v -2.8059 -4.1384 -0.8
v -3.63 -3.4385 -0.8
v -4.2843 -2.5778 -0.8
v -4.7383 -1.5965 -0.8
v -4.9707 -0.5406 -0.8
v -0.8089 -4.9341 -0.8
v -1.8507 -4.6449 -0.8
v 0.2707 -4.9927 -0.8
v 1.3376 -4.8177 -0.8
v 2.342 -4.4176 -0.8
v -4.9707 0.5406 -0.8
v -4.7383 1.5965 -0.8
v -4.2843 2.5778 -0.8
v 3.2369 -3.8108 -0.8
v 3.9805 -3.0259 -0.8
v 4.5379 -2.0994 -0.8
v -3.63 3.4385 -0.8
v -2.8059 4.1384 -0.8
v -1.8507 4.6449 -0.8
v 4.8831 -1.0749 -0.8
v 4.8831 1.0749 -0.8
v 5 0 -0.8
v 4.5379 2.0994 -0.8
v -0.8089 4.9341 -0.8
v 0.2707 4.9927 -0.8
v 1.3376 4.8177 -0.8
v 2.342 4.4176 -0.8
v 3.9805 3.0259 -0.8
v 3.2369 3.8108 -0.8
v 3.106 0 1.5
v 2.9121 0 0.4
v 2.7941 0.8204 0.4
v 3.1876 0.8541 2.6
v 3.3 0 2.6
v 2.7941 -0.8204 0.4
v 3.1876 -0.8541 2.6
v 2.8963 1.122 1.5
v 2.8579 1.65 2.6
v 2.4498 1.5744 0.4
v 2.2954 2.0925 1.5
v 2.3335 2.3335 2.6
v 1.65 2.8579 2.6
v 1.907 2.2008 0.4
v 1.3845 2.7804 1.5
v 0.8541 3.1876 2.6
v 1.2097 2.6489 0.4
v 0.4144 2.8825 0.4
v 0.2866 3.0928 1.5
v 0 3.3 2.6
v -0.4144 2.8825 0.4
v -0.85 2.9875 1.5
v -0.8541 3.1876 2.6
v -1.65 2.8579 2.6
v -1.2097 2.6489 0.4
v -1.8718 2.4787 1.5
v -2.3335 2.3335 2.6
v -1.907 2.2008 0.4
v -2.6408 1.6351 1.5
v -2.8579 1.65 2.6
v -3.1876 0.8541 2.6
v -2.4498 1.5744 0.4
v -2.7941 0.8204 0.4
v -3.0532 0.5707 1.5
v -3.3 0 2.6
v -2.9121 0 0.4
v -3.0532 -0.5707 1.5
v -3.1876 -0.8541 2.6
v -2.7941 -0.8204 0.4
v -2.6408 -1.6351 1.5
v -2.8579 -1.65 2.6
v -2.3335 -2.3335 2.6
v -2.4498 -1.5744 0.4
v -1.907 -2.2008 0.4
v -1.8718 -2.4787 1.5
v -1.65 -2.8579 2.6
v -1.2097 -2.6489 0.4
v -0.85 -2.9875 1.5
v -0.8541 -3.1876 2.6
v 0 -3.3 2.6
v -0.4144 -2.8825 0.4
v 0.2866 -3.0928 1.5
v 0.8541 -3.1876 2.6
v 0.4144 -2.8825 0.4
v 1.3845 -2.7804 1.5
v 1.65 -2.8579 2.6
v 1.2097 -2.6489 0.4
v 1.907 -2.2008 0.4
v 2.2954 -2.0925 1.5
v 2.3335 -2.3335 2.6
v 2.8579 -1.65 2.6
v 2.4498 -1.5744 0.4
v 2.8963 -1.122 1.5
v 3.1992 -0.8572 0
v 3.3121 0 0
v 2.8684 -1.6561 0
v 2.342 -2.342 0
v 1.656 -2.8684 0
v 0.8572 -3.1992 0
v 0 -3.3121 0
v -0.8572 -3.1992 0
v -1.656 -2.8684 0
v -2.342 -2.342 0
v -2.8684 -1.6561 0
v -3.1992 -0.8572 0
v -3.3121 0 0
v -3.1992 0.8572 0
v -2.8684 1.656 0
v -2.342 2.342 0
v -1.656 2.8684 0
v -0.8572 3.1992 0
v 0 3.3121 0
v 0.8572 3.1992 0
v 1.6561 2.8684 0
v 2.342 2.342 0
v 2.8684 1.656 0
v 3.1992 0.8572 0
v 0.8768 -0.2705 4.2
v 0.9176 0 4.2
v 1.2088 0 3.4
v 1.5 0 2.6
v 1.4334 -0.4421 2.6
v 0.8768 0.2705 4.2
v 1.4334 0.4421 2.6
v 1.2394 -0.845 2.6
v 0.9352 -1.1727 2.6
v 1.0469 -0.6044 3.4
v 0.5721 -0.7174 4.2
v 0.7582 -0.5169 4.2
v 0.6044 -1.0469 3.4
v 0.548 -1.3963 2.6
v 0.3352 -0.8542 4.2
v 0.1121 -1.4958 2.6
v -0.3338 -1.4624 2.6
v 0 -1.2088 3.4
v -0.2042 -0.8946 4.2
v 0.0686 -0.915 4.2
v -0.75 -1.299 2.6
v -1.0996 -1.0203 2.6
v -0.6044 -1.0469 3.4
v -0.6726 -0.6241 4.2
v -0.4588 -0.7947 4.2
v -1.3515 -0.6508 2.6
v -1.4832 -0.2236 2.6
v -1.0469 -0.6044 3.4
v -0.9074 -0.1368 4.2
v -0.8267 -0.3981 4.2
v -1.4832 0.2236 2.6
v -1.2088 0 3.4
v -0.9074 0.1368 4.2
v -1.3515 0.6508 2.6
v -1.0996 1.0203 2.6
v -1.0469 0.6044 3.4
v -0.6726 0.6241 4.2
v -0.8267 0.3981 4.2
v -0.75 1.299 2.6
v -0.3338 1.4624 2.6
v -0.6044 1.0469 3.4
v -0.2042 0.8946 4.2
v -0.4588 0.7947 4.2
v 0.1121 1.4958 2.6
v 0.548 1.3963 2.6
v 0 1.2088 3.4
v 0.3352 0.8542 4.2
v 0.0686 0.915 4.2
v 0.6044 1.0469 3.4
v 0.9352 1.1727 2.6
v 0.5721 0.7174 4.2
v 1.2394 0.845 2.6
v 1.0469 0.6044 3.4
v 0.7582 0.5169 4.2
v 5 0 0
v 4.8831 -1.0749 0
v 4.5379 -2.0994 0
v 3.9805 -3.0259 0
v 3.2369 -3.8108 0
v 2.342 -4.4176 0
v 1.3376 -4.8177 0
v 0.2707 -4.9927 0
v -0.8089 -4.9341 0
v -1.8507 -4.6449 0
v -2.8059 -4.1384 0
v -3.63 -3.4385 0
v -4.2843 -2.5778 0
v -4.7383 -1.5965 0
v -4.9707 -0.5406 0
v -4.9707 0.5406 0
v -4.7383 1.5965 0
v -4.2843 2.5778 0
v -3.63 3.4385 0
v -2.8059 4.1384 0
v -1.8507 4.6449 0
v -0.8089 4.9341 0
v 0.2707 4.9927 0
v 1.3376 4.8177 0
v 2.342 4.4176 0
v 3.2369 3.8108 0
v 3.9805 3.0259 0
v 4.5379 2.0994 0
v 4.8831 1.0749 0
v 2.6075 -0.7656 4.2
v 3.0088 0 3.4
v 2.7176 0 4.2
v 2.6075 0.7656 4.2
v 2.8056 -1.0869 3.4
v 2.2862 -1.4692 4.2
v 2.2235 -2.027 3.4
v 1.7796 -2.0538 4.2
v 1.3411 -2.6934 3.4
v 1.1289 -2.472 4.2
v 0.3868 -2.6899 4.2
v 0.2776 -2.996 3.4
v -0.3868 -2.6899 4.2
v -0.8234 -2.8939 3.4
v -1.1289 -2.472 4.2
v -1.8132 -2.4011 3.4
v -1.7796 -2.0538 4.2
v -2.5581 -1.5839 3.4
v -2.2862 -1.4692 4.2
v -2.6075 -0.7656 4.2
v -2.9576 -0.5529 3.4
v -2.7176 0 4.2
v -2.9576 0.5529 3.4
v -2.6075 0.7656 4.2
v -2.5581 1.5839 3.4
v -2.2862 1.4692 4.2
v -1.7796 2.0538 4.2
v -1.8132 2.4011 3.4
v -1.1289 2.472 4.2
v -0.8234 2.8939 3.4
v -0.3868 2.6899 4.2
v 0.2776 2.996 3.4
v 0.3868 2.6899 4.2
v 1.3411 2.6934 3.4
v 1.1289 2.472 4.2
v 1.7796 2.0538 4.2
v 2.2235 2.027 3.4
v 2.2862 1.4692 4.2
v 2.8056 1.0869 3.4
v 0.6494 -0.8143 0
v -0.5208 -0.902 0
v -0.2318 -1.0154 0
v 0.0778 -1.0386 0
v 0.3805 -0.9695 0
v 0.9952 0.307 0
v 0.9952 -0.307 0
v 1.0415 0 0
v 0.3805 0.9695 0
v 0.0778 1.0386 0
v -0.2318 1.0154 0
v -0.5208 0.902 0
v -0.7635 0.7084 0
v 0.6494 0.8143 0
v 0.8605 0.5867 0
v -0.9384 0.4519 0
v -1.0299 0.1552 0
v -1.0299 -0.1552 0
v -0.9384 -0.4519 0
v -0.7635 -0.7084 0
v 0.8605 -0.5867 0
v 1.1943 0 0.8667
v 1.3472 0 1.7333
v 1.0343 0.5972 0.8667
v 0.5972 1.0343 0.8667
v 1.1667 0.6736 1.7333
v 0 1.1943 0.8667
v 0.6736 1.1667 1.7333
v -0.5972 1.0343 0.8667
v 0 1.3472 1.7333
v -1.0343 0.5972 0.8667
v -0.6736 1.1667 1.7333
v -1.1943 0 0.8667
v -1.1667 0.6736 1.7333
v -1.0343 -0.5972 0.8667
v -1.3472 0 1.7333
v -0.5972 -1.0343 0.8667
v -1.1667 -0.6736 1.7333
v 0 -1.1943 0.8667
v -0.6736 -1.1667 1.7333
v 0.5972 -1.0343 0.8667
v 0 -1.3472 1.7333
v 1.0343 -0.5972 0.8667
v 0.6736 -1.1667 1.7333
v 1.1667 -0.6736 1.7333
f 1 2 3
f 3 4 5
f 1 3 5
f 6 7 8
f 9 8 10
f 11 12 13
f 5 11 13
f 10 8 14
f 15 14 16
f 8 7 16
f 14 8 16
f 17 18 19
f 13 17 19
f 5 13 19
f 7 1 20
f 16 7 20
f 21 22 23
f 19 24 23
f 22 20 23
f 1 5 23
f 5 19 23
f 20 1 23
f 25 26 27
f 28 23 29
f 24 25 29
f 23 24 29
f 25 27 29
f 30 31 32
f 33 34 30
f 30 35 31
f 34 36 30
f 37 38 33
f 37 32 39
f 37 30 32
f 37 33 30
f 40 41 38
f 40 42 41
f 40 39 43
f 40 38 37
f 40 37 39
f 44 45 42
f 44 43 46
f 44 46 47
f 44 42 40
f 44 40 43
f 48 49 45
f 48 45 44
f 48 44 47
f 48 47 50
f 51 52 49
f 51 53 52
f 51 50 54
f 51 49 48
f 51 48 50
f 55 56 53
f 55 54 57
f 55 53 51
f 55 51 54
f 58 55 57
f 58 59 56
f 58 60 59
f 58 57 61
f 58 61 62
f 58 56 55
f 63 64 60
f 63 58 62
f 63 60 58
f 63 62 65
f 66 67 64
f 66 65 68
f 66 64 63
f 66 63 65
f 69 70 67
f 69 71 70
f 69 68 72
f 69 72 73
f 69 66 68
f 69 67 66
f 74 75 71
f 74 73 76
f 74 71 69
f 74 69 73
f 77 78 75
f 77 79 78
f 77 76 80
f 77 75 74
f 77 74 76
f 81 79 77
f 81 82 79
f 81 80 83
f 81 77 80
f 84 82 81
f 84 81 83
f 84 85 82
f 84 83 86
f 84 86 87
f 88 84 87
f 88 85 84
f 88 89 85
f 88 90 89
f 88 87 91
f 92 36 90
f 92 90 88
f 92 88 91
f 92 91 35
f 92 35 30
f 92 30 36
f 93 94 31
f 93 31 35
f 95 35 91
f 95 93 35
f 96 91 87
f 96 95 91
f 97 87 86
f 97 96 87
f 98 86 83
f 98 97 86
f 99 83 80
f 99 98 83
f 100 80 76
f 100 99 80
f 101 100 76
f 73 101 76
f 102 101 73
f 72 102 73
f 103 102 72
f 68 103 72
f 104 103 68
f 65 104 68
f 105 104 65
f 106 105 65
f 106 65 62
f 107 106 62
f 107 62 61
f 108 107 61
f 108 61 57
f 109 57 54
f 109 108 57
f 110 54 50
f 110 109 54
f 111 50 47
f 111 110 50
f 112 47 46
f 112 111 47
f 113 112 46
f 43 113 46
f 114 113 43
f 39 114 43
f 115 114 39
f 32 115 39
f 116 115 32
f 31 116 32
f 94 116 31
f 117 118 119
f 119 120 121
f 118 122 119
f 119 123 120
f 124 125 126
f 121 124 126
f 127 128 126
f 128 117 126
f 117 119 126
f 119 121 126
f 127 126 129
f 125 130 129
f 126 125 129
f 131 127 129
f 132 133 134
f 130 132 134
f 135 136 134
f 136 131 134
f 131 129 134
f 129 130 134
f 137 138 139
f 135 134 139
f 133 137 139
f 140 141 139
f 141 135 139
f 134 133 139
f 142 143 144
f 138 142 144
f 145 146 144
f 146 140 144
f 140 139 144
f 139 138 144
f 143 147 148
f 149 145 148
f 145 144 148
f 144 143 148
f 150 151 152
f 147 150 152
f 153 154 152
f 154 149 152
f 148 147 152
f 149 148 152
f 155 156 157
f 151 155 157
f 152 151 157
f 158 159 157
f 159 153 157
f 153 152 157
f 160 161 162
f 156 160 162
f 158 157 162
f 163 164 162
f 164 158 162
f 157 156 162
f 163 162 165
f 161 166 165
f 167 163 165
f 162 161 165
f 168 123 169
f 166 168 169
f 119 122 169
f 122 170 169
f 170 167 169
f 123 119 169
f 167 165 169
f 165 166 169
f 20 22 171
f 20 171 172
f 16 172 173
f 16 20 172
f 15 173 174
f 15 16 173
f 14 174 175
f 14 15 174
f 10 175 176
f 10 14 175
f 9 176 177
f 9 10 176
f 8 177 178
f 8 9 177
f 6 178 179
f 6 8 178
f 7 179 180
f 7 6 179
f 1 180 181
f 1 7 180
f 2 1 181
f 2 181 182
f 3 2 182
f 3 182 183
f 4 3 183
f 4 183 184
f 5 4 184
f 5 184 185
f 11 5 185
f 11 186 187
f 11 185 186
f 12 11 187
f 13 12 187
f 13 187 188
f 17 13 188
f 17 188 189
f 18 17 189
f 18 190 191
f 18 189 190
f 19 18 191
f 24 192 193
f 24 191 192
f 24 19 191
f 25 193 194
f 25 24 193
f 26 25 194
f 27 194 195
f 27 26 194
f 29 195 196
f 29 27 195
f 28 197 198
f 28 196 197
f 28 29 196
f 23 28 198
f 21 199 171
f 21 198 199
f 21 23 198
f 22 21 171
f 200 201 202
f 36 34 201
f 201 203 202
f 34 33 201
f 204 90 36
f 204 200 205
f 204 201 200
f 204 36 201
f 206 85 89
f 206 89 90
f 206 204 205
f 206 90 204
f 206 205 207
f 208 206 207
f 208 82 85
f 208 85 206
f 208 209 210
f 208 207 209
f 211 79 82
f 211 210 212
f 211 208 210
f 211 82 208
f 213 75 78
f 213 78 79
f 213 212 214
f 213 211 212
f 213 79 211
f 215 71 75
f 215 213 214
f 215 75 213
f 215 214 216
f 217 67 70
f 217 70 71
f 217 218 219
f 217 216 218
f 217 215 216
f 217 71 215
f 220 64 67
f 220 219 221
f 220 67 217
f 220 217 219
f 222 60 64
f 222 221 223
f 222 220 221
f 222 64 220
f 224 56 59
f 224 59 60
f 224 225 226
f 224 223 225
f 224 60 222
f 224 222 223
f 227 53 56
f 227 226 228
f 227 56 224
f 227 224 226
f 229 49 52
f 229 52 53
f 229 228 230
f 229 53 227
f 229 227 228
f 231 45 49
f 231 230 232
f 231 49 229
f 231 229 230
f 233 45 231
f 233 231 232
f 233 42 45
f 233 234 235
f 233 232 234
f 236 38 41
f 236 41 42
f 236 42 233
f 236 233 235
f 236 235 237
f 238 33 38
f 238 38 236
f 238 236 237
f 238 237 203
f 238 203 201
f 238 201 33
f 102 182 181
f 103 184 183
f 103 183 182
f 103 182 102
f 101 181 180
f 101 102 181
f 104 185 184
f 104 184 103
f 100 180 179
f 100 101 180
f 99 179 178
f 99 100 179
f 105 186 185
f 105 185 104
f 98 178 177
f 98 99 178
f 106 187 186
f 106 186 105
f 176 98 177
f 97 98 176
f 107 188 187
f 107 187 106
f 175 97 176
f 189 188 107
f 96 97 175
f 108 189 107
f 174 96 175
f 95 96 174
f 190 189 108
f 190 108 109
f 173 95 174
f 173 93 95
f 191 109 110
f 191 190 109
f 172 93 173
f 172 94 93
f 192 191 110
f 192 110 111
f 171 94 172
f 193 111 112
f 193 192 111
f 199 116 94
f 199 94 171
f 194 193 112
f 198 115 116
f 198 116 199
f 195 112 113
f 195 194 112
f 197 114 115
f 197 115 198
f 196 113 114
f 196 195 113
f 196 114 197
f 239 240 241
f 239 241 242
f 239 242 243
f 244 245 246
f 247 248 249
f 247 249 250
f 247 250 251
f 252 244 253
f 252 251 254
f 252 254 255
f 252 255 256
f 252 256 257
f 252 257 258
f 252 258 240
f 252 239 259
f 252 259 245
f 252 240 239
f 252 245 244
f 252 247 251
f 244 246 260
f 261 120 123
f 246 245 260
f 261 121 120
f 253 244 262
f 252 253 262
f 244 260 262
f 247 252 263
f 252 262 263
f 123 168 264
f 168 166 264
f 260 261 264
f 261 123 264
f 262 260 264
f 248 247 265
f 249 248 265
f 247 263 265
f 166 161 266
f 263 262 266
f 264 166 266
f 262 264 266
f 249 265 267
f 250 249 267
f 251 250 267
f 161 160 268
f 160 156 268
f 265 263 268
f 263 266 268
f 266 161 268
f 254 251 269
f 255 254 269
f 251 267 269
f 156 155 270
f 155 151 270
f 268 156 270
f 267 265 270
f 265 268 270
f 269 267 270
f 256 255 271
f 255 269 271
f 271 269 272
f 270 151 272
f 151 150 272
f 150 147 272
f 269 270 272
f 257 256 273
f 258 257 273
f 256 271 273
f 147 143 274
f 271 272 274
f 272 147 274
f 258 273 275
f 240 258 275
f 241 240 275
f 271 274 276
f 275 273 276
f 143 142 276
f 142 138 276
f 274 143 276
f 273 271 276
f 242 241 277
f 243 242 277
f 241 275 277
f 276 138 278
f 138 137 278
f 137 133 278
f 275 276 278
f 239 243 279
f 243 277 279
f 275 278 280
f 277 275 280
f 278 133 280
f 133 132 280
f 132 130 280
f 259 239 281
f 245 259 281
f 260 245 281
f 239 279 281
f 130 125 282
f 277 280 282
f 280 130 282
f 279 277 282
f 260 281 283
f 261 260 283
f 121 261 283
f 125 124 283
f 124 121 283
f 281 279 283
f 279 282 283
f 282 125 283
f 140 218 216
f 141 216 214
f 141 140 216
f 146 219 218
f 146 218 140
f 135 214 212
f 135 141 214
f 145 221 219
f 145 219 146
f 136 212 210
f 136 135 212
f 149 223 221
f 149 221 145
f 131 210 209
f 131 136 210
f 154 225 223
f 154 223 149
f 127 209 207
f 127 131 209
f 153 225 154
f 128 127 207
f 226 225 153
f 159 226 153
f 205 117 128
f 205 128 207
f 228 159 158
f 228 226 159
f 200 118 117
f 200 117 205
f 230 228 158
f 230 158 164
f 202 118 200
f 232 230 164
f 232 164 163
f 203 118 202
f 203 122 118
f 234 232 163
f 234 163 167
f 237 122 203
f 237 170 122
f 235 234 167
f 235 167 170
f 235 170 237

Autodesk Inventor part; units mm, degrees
ref_plane "YZ Plane" through (0, 0, 0) normal (1, 0, 0) x (0, 1, 0)
ref_plane "XZ Plane" through (0, 0, 0) normal (0, 1, 0) x (-1, 0, 0)
ref_plane "XY Plane" through (0, 0, 0) normal (0, 0, 1) x (1, 0, 0)
sketch "Skizze1" plane through (0, 0, 0) normal (0, 1, 0) x (-1, 0, 0)
  line L0 (-6, 0) -> (1, 0) construction
  line L1 (-1.0415, 0) -> (-1.5, 2.6)
  line L2 (-1.5, 2.6) -> (-0.9176, 4.2)
  line L3 (-0.9176, 4.2) -> (-2.7176, 4.2)
  line L4 (-2.7176, 4.2) -> (-3.3, 2.6)
  line L5 (-3.3, 2.6) -> (-2.9121, 0.4)
  line L6 (-1.5, 2.6) -> (-3.3, 2.6) construction
  line L7 (-2.9121, 0.4) -> (-3.3121, 0)
  line L8 (-3.3121, 0) -> (-5, 0)
  line L9 (-5, 0) -> (-5, -0.8)
  line L10 (-5, -0.8) -> (0, -0.8)
  line L11 (0, -0.8) -> (0, 0)
  line L12 (-1.0415, 0) -> (0, 0)
  line L13 (0, -0.8) -> (0, 4.2)
  dimension "d0" = 80
  dimension "d1" = 70
  dimension "d2" = 1.8
  dimension "d3" = 2.6
  dimension "d4" = 1.6
  dimension "d21" = 45
  dimension "d22" = 0.4
  dimension "d23" = 0.8
  dimension "d24" = 10
  dimension "d26" = 6.6
revolve "Umdrehung1" add sketch "Skizze1" angle 360 about axis through (0, 0, -0.8) along (0, 0, 1)
properties part number "Druckknopf" material "Gummi, Silikon"
